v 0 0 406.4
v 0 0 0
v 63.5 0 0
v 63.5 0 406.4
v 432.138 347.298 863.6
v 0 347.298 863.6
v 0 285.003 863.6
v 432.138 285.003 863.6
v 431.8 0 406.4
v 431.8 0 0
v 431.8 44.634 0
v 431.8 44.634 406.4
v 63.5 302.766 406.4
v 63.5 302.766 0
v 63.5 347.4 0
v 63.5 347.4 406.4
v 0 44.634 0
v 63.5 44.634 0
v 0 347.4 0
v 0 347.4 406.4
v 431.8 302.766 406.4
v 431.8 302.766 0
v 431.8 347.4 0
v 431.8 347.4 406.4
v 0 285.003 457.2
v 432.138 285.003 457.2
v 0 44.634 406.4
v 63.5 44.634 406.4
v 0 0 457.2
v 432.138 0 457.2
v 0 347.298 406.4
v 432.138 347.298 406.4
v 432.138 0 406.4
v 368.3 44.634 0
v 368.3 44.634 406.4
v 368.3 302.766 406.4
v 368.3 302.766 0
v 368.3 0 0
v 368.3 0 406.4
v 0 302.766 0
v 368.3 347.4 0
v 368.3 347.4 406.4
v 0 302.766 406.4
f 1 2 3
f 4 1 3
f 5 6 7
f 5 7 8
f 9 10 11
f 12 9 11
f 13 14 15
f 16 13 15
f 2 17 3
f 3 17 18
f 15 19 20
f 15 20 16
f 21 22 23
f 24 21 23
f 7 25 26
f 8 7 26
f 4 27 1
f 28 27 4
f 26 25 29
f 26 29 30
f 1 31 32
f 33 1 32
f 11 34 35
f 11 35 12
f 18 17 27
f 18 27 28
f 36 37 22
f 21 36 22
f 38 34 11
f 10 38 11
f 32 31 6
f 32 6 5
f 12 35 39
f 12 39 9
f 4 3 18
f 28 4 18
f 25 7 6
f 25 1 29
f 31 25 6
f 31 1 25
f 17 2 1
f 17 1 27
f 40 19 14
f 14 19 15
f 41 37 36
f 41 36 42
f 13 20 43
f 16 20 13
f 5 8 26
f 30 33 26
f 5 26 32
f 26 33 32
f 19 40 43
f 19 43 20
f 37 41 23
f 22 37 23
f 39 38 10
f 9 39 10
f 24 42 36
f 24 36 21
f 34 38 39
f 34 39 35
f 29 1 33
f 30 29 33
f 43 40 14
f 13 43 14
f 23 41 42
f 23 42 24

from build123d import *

# Parameters (mm, degrees)
F0_W     = 63.5
F0_H     = 44.634058
F1_DEPTH = 406.4
F2_W     = 432.138145
F2_H     = 347.297758
F3_DEPTH = 50.8
F4_W     = 432.138145
F4_H     = 62.294394
F5_DEPTH = 406.4


with BuildPart() as f1:
    # F0 (on Top) → F1 (new body)
    with BuildSketch(Plane.XY):
        with Locations((31.75, 22.317029)):
            Rectangle(F0_W, F0_H)
        with Locations((400.05, 22.317029)):
            Rectangle(F0_W, F0_H)
        with Locations((31.75, 325.083428)):
            Rectangle(F0_W, F0_H)
        with Locations((400.05, 325.083428)):
            Rectangle(F0_W, F0_H)
    extrude(amount=F1_DEPTH)


with BuildPart() as f3:
    # F2 (on face) → F3 (new body)
    with BuildSketch(Plane.XY.offset(406.4)):
        with Locations((216.069073, 173.648879)):
            Rectangle(F2_W, F2_H)
    extrude(amount=F3_DEPTH)

    # F4 (on face) → F5 (join)
    with BuildSketch(Plane.XY.offset(457.2)):
        with Locations((216.069073, 316.150561)):
            Rectangle(F4_W, F4_H)
    extrude(amount=F5_DEPTH)


solid = Compound([f1.part, f3.part])
